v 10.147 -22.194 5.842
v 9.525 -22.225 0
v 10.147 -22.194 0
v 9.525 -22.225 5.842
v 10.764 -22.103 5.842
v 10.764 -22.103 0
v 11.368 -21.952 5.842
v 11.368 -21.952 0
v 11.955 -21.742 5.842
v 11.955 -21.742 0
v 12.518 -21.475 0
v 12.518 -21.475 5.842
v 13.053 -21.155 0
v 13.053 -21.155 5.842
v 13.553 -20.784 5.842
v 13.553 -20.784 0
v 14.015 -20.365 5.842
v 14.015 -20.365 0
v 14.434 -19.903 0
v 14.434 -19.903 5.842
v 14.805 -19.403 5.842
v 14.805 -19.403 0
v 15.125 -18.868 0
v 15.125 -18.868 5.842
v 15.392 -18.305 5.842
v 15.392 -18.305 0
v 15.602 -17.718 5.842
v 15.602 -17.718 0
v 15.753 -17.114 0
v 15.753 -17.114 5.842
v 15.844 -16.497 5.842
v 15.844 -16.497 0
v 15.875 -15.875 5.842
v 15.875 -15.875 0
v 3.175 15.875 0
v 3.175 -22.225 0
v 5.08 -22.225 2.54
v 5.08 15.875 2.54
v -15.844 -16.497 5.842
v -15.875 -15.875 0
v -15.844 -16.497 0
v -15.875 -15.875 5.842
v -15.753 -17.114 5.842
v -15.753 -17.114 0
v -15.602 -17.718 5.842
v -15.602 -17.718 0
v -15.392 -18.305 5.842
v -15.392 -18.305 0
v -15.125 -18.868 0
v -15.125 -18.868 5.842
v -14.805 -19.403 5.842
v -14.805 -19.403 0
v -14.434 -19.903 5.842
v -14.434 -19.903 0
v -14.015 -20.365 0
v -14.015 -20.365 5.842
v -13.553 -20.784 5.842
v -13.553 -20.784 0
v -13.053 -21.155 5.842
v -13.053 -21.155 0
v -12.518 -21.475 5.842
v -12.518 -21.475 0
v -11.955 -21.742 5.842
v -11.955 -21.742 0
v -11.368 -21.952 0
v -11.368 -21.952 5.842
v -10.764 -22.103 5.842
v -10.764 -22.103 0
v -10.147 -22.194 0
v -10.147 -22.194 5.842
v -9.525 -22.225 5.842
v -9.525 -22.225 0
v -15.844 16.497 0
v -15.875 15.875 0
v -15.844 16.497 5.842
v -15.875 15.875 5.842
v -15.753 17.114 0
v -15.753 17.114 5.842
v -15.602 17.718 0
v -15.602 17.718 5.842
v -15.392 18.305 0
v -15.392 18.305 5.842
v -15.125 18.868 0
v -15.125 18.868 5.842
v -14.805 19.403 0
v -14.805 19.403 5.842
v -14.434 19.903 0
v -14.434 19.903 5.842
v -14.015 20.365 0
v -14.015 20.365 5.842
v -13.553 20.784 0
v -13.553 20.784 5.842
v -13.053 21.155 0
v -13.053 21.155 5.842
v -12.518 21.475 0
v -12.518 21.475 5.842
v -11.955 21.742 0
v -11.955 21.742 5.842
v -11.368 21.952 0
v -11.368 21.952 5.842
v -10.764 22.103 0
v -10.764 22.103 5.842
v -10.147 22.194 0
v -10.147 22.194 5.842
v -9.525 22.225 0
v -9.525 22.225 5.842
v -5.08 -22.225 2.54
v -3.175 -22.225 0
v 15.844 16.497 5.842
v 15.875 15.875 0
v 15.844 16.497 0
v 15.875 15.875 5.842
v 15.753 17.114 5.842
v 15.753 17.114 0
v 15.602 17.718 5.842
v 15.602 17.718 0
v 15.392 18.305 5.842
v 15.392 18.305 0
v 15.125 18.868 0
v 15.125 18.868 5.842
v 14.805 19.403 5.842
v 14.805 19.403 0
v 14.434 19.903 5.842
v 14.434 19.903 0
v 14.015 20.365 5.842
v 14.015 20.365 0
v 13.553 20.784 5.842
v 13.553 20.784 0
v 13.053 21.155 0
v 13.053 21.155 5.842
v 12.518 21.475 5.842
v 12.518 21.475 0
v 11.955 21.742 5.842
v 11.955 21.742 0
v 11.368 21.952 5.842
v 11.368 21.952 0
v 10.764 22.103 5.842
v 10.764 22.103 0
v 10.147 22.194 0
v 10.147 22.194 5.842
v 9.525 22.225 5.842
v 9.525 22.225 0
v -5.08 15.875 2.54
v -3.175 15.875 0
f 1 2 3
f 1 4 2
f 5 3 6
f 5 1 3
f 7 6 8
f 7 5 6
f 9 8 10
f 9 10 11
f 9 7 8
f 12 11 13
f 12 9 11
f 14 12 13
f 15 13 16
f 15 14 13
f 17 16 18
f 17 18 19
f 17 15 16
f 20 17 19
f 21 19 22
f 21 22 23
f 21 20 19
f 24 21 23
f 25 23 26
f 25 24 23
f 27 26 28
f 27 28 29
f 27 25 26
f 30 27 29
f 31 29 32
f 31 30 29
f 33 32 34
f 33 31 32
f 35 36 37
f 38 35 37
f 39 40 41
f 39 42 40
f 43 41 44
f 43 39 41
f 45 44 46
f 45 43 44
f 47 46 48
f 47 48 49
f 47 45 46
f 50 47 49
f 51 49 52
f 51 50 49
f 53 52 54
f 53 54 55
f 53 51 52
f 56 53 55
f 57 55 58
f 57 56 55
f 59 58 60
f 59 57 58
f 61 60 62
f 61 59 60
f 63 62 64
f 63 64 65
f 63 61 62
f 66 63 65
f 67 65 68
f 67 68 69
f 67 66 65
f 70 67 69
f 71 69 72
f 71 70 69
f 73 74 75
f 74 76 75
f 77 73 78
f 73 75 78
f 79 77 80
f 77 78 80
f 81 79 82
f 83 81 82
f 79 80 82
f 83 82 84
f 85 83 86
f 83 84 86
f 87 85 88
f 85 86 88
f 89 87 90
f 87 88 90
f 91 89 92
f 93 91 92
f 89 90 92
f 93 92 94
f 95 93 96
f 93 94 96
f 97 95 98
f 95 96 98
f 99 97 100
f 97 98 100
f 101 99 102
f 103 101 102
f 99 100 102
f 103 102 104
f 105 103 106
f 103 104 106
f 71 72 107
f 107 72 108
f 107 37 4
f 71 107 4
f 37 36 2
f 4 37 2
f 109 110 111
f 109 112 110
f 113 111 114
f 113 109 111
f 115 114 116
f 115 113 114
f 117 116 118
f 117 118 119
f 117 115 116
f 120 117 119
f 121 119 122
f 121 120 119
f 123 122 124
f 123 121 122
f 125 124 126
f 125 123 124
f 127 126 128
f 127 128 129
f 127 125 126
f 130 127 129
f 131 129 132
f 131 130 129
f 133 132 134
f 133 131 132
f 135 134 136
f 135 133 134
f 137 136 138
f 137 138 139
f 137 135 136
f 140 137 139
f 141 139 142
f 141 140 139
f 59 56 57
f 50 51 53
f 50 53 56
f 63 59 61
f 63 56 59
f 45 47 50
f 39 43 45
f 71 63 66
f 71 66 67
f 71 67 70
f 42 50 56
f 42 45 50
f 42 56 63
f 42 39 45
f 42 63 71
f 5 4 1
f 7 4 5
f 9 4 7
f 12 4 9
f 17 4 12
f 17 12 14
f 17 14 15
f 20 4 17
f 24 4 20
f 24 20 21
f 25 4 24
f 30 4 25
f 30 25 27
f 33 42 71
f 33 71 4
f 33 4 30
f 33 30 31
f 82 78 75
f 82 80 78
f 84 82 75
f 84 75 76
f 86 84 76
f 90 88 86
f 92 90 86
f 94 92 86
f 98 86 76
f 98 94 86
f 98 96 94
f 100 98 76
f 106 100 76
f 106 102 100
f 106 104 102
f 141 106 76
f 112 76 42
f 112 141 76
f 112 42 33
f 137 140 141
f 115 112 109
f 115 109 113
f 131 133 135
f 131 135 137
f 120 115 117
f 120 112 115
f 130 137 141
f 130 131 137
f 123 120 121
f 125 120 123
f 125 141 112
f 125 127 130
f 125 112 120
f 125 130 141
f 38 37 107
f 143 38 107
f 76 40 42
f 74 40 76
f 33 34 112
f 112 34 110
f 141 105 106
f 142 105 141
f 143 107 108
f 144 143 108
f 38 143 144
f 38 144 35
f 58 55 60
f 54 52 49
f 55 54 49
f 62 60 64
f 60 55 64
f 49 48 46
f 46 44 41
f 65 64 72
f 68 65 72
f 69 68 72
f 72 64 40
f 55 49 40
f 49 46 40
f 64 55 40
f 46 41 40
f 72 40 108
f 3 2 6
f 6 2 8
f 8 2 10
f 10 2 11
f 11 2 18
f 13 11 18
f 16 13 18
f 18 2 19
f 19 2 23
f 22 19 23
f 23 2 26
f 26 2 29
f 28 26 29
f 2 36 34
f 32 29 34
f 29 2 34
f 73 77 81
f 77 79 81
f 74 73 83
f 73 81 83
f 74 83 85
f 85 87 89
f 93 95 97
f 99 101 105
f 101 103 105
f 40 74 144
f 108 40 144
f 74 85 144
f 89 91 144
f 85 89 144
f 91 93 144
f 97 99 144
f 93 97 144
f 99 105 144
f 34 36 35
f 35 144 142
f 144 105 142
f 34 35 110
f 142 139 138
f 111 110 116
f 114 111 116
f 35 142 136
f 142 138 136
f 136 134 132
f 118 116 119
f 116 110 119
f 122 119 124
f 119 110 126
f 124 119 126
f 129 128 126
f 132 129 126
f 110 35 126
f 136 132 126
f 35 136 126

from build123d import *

# Parameters (mm, degrees)
F0_W     = 31.75
F0_H     = 44.45
F1_DEPTH = 5.842
F2_R     = 6.35
F4_DEPTH = 38.1


with BuildPart() as f1:
    # F0 (on Top) → F1 (new body)
    with BuildSketch(Plane.XY):
        Rectangle(F0_W, F0_H)
    extrude(amount=F1_DEPTH)

    # F2
    f2_edges = [f1.edges().sort_by_distance(p)[0] for p in [
        (15.875, 22.225, 2.921),
        (-15.875, 22.225, 2.921),
        (-15.875, -22.225, 2.921),
        (15.875, -22.225, 2.921),
    ]]
    fillet(f2_edges, radius=F2_R)

    # F3 (on face) → F4 (cut)
    with BuildSketch(Plane.XZ.offset(22.225)):
        Polygon((5.08, 2.54), (0, 2.54), (-5.08, 2.54), (-3.175, 0), (3.175, 0), align=None)
    extrude(amount=-F4_DEPTH, mode=Mode.SUBTRACT)


solid = f1.part
